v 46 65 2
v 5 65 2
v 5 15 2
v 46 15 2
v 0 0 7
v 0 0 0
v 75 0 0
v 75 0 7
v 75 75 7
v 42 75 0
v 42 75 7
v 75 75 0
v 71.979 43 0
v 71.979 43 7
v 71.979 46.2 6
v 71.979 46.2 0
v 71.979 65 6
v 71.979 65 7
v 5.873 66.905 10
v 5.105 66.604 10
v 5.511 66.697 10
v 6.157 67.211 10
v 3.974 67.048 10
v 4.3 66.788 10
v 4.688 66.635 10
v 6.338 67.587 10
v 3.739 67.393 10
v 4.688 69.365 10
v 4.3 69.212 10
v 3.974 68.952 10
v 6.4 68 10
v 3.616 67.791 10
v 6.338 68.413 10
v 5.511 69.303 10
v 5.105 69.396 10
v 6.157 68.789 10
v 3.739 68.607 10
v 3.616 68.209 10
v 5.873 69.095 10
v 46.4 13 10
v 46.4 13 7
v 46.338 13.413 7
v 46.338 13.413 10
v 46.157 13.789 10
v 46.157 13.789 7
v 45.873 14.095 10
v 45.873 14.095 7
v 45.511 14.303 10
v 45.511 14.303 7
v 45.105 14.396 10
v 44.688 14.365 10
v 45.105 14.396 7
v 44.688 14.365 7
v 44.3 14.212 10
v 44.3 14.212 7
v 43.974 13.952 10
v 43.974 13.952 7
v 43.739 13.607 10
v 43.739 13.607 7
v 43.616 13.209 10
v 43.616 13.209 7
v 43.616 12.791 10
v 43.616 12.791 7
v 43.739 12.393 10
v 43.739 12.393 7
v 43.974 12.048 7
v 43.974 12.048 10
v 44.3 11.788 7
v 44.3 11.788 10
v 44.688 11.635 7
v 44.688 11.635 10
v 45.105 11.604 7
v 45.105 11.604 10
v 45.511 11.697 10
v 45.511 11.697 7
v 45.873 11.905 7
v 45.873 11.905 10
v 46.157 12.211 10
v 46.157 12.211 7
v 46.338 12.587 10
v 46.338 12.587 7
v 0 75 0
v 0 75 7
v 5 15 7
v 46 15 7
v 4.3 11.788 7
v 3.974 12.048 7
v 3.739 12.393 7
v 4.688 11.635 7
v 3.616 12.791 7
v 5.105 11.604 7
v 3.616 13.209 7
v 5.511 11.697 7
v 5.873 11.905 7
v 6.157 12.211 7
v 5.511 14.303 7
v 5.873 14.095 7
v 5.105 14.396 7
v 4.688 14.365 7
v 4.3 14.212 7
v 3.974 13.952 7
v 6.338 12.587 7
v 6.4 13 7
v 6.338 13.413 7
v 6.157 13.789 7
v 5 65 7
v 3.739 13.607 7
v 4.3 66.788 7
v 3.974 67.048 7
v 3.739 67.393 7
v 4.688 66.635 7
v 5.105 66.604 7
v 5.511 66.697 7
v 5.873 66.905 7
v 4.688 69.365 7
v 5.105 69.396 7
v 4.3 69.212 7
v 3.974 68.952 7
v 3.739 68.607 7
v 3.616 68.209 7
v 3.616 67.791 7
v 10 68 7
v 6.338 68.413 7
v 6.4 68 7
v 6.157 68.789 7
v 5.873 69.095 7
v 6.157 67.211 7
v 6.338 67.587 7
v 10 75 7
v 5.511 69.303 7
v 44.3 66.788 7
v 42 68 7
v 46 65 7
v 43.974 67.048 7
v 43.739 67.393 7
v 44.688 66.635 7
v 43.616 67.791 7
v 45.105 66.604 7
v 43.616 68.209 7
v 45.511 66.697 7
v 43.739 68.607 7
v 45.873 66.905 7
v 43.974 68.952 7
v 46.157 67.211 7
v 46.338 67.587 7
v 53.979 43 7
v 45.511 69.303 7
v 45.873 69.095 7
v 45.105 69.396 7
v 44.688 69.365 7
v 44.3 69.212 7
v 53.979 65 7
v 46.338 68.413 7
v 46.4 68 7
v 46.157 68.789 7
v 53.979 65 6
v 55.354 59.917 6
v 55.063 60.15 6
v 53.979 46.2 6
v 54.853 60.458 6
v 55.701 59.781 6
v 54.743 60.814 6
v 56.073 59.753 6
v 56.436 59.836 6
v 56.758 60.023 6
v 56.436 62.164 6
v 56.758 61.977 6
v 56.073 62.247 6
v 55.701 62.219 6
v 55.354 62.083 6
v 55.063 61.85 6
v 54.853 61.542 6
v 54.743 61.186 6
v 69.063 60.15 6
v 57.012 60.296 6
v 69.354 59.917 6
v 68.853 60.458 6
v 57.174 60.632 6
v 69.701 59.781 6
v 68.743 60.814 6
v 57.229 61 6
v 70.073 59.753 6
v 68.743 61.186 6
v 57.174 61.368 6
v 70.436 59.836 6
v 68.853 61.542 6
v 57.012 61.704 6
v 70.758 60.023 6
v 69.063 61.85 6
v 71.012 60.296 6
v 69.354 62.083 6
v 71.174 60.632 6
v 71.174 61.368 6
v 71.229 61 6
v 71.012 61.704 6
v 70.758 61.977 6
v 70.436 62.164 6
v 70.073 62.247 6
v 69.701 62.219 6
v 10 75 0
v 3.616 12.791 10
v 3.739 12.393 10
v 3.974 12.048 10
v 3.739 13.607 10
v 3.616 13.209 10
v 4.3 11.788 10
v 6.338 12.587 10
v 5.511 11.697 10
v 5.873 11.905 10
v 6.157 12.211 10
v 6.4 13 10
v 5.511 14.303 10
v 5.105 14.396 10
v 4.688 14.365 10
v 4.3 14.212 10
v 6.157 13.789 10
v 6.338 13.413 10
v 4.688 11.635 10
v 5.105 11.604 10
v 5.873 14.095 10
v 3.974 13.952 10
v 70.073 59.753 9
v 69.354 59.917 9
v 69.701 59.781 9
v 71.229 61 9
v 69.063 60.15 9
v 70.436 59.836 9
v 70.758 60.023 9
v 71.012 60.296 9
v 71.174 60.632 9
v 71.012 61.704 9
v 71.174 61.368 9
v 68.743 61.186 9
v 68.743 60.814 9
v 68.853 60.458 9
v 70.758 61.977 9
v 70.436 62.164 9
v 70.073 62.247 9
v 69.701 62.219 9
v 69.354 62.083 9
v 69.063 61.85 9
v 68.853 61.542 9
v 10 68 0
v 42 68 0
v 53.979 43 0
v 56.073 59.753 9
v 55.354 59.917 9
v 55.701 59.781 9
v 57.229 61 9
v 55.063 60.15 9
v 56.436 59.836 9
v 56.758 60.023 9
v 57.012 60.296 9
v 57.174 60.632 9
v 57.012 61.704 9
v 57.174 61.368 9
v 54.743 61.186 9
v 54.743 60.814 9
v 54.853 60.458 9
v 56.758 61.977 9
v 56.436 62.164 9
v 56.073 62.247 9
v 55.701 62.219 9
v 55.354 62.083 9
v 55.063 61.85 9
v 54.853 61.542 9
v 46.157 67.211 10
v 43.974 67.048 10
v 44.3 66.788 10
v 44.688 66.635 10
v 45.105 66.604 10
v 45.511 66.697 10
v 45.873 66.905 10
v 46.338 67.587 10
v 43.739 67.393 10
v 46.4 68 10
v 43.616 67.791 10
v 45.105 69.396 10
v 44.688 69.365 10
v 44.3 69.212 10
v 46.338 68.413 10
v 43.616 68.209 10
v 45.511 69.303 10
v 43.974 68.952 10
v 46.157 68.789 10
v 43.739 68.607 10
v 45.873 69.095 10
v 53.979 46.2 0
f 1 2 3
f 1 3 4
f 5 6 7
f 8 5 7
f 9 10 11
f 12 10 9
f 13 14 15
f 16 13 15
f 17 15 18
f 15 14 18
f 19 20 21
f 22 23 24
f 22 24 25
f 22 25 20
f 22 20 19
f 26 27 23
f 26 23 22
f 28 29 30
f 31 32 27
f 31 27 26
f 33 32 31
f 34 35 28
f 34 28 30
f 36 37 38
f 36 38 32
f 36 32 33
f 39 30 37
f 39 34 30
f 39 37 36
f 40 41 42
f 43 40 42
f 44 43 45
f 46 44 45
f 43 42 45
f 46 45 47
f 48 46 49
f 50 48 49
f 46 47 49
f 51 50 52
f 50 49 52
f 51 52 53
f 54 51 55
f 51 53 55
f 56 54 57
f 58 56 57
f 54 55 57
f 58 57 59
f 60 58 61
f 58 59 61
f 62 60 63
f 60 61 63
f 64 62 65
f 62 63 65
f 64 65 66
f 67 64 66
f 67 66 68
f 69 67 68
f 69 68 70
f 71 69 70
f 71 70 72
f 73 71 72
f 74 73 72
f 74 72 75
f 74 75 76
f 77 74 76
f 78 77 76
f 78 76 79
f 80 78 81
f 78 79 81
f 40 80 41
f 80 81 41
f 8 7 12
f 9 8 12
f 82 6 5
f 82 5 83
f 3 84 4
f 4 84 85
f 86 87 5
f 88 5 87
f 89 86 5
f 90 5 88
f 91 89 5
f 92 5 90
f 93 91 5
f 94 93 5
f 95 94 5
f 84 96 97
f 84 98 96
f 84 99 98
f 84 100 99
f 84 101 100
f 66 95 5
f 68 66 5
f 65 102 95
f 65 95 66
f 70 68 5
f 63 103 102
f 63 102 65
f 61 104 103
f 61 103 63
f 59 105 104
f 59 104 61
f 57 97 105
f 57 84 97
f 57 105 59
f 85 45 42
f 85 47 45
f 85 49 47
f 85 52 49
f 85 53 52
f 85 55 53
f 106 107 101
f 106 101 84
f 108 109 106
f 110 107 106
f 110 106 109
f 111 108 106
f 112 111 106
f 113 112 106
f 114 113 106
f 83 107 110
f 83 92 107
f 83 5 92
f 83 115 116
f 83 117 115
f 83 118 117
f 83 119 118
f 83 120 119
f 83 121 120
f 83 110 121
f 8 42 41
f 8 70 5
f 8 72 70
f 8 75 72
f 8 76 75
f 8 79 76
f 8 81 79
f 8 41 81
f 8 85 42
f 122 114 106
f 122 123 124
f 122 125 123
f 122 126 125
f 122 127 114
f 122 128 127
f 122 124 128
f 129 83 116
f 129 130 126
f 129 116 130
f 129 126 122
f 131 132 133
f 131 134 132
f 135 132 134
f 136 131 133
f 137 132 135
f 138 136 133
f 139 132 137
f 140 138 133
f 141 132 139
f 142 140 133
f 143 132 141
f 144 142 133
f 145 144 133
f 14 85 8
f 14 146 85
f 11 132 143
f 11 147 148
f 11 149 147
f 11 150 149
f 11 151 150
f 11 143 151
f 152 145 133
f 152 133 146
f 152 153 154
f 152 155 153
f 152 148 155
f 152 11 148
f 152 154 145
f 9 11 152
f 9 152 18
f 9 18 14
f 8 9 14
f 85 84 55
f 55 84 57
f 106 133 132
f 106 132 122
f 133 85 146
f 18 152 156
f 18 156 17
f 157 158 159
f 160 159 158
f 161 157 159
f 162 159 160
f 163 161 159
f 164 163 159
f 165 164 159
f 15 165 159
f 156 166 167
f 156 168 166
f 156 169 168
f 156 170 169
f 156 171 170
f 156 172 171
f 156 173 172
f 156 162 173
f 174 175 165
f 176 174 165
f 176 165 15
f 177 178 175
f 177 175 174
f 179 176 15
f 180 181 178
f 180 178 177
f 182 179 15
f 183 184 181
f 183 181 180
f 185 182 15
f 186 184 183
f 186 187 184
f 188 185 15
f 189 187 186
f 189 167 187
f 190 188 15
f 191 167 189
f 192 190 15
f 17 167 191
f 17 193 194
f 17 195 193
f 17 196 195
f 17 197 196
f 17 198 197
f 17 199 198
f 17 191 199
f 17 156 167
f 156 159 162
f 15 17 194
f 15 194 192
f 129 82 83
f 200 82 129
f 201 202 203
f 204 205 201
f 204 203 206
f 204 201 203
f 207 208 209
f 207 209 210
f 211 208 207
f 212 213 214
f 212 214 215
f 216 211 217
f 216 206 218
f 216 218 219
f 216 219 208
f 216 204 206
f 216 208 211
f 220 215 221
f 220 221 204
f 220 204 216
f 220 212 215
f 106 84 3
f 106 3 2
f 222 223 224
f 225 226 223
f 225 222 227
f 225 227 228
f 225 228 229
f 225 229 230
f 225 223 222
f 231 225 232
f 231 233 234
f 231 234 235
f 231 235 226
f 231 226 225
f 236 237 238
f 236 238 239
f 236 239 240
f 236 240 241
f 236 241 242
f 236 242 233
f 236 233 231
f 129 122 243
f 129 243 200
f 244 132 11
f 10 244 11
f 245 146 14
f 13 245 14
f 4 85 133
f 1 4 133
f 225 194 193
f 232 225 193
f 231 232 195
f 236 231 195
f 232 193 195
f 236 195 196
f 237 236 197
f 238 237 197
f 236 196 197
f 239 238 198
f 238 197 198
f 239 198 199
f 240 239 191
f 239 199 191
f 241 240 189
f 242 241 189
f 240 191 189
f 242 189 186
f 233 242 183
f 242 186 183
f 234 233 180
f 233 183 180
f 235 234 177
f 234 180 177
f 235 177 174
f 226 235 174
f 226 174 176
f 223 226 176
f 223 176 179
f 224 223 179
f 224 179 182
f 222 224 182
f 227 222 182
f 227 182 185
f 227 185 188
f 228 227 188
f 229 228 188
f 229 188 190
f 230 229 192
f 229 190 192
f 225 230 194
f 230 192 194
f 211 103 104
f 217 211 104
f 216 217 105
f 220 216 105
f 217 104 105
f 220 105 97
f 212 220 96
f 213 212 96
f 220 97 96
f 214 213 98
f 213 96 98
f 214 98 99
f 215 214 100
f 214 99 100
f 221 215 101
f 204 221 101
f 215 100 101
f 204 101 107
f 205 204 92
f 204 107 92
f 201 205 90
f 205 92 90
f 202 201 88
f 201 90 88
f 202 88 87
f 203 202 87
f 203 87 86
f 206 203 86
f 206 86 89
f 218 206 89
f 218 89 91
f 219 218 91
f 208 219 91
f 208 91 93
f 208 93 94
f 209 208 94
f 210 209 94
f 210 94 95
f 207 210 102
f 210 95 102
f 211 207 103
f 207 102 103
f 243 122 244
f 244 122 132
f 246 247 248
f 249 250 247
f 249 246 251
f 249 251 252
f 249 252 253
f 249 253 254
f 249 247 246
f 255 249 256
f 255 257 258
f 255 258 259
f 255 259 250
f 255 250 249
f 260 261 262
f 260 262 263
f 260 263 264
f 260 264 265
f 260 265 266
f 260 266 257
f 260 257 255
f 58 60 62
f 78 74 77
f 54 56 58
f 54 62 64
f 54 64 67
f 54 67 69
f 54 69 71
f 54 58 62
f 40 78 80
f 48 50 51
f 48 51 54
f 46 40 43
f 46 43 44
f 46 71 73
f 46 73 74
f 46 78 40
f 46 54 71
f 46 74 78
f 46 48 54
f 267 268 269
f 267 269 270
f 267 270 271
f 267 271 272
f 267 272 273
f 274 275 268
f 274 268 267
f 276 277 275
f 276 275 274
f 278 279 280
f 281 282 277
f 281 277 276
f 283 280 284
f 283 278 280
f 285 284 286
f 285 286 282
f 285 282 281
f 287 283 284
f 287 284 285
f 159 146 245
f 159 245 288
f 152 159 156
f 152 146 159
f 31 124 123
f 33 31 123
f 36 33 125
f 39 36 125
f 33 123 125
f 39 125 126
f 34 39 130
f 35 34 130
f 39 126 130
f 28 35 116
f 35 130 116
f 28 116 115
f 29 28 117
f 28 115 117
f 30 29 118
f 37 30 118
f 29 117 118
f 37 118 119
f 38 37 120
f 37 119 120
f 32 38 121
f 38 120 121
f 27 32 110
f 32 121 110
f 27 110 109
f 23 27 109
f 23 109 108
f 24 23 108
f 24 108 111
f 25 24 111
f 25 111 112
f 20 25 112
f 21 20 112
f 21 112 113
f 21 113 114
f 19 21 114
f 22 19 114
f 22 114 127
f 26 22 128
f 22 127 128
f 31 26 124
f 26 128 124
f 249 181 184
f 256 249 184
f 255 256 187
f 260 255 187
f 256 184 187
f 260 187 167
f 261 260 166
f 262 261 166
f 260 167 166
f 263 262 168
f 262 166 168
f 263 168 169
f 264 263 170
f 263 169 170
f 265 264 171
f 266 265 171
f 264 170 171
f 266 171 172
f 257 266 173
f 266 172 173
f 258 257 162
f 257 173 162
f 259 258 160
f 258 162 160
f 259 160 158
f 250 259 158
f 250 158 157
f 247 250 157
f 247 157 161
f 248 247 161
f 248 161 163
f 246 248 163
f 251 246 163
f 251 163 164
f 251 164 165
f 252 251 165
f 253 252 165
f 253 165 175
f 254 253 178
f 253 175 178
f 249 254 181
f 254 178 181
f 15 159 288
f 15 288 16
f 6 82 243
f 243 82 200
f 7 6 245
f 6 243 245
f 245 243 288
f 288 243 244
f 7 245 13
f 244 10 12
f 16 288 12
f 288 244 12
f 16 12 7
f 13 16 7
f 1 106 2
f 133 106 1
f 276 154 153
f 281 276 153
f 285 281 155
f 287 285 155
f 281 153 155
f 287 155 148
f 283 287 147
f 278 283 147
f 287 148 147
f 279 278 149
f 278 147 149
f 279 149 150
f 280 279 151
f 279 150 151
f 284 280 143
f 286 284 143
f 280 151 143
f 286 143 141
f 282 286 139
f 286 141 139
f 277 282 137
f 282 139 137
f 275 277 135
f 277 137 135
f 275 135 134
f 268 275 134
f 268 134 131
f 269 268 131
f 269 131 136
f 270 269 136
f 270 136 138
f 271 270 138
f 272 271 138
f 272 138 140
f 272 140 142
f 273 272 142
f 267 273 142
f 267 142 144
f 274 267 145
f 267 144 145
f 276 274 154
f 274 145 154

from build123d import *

# Parameters (mm, degrees)
SKETCH_W        = 75
SKETCH_H        = 75
PAD_DEPTH       = 7
SKETCH001_R     = 1.4
PAD001_DEPTH    = 3
SKETCH002_W     = 41
SKETCH002_H     = 50
POCKET_DEPTH    = 5
SKETCH003_W     = 18
SKETCH003_H     = 22
POCKET001_DEPTH = 1
SKETCH004_W     = 18
SKETCH004_H     = 3.2
POCKET002_DEPTH = 6.001
SKETCH005_R     = 1.25
PAD002_DEPTH    = 3
SKETCH006_W     = 32
SKETCH006_H     = 10
POCKET003_DEPTH = 7.001


with BuildPart() as part:
    # Sketch → Pad (new body)
    with BuildSketch(Plane.XY):
        with Locations((37.5, 37.5)):
            Rectangle(SKETCH_W, SKETCH_H)
    extrude(amount=PAD_DEPTH)

    # Sketch001 (on Face6 of Pad) → Pad001 (join)
    with BuildSketch(Plane.XY.offset(7)):
        with Locations((5, 68)):
            Circle(SKETCH001_R)
        with Locations((45, 68)):
            Circle(SKETCH001_R)
        with Locations((5, 13)):
            Circle(SKETCH001_R)
        with Locations((45, 13)):
            Circle(SKETCH001_R)
    extrude(amount=PAD001_DEPTH)

    # Sketch002 (on Face5 of Pad001) → Pocket (cut)
    with BuildSketch(Plane.XY.offset(7)):
        with Locations((25.5, 40)):
            Rectangle(SKETCH002_W, SKETCH002_H)
    extrude(amount=-POCKET_DEPTH, mode=Mode.SUBTRACT)

    # Sketch003 (on Face5 of Pocket) → Pocket001 (cut)
    with BuildSketch(Plane.XY.offset(7)):
        with Locations((62.979134, 54)):
            Rectangle(SKETCH003_W, SKETCH003_H)
    extrude(amount=-POCKET001_DEPTH, mode=Mode.SUBTRACT)

    # Sketch004 (on Face23 of Pocket001) → Pocket002 (cut, through all)
    with BuildSketch(Plane.XY.offset(6)):
        with Locations((62.979134, 44.6)):
            Rectangle(SKETCH004_W, SKETCH004_H)
    extrude(amount=-POCKET002_DEPTH, mode=Mode.SUBTRACT)

    # Sketch005 (on Face23 of Pocket002) → Pad002 (join)
    with BuildSketch(Plane.XY.offset(6)):
        with Locations((55.979134, 61)):
            Circle(SKETCH005_R)
        with Locations((69.979134, 61)):
            Circle(SKETCH005_R)
    extrude(amount=PAD002_DEPTH)

    # Sketch006 (on Face5 of Pad002) → Pocket003 (cut, through all)
    with BuildSketch(Plane.XY.offset(7)):
        with Locations((26, 73)):
            Rectangle(SKETCH006_W, SKETCH006_H)
    extrude(amount=-POCKET003_DEPTH, mode=Mode.SUBTRACT)


solid = part.part
